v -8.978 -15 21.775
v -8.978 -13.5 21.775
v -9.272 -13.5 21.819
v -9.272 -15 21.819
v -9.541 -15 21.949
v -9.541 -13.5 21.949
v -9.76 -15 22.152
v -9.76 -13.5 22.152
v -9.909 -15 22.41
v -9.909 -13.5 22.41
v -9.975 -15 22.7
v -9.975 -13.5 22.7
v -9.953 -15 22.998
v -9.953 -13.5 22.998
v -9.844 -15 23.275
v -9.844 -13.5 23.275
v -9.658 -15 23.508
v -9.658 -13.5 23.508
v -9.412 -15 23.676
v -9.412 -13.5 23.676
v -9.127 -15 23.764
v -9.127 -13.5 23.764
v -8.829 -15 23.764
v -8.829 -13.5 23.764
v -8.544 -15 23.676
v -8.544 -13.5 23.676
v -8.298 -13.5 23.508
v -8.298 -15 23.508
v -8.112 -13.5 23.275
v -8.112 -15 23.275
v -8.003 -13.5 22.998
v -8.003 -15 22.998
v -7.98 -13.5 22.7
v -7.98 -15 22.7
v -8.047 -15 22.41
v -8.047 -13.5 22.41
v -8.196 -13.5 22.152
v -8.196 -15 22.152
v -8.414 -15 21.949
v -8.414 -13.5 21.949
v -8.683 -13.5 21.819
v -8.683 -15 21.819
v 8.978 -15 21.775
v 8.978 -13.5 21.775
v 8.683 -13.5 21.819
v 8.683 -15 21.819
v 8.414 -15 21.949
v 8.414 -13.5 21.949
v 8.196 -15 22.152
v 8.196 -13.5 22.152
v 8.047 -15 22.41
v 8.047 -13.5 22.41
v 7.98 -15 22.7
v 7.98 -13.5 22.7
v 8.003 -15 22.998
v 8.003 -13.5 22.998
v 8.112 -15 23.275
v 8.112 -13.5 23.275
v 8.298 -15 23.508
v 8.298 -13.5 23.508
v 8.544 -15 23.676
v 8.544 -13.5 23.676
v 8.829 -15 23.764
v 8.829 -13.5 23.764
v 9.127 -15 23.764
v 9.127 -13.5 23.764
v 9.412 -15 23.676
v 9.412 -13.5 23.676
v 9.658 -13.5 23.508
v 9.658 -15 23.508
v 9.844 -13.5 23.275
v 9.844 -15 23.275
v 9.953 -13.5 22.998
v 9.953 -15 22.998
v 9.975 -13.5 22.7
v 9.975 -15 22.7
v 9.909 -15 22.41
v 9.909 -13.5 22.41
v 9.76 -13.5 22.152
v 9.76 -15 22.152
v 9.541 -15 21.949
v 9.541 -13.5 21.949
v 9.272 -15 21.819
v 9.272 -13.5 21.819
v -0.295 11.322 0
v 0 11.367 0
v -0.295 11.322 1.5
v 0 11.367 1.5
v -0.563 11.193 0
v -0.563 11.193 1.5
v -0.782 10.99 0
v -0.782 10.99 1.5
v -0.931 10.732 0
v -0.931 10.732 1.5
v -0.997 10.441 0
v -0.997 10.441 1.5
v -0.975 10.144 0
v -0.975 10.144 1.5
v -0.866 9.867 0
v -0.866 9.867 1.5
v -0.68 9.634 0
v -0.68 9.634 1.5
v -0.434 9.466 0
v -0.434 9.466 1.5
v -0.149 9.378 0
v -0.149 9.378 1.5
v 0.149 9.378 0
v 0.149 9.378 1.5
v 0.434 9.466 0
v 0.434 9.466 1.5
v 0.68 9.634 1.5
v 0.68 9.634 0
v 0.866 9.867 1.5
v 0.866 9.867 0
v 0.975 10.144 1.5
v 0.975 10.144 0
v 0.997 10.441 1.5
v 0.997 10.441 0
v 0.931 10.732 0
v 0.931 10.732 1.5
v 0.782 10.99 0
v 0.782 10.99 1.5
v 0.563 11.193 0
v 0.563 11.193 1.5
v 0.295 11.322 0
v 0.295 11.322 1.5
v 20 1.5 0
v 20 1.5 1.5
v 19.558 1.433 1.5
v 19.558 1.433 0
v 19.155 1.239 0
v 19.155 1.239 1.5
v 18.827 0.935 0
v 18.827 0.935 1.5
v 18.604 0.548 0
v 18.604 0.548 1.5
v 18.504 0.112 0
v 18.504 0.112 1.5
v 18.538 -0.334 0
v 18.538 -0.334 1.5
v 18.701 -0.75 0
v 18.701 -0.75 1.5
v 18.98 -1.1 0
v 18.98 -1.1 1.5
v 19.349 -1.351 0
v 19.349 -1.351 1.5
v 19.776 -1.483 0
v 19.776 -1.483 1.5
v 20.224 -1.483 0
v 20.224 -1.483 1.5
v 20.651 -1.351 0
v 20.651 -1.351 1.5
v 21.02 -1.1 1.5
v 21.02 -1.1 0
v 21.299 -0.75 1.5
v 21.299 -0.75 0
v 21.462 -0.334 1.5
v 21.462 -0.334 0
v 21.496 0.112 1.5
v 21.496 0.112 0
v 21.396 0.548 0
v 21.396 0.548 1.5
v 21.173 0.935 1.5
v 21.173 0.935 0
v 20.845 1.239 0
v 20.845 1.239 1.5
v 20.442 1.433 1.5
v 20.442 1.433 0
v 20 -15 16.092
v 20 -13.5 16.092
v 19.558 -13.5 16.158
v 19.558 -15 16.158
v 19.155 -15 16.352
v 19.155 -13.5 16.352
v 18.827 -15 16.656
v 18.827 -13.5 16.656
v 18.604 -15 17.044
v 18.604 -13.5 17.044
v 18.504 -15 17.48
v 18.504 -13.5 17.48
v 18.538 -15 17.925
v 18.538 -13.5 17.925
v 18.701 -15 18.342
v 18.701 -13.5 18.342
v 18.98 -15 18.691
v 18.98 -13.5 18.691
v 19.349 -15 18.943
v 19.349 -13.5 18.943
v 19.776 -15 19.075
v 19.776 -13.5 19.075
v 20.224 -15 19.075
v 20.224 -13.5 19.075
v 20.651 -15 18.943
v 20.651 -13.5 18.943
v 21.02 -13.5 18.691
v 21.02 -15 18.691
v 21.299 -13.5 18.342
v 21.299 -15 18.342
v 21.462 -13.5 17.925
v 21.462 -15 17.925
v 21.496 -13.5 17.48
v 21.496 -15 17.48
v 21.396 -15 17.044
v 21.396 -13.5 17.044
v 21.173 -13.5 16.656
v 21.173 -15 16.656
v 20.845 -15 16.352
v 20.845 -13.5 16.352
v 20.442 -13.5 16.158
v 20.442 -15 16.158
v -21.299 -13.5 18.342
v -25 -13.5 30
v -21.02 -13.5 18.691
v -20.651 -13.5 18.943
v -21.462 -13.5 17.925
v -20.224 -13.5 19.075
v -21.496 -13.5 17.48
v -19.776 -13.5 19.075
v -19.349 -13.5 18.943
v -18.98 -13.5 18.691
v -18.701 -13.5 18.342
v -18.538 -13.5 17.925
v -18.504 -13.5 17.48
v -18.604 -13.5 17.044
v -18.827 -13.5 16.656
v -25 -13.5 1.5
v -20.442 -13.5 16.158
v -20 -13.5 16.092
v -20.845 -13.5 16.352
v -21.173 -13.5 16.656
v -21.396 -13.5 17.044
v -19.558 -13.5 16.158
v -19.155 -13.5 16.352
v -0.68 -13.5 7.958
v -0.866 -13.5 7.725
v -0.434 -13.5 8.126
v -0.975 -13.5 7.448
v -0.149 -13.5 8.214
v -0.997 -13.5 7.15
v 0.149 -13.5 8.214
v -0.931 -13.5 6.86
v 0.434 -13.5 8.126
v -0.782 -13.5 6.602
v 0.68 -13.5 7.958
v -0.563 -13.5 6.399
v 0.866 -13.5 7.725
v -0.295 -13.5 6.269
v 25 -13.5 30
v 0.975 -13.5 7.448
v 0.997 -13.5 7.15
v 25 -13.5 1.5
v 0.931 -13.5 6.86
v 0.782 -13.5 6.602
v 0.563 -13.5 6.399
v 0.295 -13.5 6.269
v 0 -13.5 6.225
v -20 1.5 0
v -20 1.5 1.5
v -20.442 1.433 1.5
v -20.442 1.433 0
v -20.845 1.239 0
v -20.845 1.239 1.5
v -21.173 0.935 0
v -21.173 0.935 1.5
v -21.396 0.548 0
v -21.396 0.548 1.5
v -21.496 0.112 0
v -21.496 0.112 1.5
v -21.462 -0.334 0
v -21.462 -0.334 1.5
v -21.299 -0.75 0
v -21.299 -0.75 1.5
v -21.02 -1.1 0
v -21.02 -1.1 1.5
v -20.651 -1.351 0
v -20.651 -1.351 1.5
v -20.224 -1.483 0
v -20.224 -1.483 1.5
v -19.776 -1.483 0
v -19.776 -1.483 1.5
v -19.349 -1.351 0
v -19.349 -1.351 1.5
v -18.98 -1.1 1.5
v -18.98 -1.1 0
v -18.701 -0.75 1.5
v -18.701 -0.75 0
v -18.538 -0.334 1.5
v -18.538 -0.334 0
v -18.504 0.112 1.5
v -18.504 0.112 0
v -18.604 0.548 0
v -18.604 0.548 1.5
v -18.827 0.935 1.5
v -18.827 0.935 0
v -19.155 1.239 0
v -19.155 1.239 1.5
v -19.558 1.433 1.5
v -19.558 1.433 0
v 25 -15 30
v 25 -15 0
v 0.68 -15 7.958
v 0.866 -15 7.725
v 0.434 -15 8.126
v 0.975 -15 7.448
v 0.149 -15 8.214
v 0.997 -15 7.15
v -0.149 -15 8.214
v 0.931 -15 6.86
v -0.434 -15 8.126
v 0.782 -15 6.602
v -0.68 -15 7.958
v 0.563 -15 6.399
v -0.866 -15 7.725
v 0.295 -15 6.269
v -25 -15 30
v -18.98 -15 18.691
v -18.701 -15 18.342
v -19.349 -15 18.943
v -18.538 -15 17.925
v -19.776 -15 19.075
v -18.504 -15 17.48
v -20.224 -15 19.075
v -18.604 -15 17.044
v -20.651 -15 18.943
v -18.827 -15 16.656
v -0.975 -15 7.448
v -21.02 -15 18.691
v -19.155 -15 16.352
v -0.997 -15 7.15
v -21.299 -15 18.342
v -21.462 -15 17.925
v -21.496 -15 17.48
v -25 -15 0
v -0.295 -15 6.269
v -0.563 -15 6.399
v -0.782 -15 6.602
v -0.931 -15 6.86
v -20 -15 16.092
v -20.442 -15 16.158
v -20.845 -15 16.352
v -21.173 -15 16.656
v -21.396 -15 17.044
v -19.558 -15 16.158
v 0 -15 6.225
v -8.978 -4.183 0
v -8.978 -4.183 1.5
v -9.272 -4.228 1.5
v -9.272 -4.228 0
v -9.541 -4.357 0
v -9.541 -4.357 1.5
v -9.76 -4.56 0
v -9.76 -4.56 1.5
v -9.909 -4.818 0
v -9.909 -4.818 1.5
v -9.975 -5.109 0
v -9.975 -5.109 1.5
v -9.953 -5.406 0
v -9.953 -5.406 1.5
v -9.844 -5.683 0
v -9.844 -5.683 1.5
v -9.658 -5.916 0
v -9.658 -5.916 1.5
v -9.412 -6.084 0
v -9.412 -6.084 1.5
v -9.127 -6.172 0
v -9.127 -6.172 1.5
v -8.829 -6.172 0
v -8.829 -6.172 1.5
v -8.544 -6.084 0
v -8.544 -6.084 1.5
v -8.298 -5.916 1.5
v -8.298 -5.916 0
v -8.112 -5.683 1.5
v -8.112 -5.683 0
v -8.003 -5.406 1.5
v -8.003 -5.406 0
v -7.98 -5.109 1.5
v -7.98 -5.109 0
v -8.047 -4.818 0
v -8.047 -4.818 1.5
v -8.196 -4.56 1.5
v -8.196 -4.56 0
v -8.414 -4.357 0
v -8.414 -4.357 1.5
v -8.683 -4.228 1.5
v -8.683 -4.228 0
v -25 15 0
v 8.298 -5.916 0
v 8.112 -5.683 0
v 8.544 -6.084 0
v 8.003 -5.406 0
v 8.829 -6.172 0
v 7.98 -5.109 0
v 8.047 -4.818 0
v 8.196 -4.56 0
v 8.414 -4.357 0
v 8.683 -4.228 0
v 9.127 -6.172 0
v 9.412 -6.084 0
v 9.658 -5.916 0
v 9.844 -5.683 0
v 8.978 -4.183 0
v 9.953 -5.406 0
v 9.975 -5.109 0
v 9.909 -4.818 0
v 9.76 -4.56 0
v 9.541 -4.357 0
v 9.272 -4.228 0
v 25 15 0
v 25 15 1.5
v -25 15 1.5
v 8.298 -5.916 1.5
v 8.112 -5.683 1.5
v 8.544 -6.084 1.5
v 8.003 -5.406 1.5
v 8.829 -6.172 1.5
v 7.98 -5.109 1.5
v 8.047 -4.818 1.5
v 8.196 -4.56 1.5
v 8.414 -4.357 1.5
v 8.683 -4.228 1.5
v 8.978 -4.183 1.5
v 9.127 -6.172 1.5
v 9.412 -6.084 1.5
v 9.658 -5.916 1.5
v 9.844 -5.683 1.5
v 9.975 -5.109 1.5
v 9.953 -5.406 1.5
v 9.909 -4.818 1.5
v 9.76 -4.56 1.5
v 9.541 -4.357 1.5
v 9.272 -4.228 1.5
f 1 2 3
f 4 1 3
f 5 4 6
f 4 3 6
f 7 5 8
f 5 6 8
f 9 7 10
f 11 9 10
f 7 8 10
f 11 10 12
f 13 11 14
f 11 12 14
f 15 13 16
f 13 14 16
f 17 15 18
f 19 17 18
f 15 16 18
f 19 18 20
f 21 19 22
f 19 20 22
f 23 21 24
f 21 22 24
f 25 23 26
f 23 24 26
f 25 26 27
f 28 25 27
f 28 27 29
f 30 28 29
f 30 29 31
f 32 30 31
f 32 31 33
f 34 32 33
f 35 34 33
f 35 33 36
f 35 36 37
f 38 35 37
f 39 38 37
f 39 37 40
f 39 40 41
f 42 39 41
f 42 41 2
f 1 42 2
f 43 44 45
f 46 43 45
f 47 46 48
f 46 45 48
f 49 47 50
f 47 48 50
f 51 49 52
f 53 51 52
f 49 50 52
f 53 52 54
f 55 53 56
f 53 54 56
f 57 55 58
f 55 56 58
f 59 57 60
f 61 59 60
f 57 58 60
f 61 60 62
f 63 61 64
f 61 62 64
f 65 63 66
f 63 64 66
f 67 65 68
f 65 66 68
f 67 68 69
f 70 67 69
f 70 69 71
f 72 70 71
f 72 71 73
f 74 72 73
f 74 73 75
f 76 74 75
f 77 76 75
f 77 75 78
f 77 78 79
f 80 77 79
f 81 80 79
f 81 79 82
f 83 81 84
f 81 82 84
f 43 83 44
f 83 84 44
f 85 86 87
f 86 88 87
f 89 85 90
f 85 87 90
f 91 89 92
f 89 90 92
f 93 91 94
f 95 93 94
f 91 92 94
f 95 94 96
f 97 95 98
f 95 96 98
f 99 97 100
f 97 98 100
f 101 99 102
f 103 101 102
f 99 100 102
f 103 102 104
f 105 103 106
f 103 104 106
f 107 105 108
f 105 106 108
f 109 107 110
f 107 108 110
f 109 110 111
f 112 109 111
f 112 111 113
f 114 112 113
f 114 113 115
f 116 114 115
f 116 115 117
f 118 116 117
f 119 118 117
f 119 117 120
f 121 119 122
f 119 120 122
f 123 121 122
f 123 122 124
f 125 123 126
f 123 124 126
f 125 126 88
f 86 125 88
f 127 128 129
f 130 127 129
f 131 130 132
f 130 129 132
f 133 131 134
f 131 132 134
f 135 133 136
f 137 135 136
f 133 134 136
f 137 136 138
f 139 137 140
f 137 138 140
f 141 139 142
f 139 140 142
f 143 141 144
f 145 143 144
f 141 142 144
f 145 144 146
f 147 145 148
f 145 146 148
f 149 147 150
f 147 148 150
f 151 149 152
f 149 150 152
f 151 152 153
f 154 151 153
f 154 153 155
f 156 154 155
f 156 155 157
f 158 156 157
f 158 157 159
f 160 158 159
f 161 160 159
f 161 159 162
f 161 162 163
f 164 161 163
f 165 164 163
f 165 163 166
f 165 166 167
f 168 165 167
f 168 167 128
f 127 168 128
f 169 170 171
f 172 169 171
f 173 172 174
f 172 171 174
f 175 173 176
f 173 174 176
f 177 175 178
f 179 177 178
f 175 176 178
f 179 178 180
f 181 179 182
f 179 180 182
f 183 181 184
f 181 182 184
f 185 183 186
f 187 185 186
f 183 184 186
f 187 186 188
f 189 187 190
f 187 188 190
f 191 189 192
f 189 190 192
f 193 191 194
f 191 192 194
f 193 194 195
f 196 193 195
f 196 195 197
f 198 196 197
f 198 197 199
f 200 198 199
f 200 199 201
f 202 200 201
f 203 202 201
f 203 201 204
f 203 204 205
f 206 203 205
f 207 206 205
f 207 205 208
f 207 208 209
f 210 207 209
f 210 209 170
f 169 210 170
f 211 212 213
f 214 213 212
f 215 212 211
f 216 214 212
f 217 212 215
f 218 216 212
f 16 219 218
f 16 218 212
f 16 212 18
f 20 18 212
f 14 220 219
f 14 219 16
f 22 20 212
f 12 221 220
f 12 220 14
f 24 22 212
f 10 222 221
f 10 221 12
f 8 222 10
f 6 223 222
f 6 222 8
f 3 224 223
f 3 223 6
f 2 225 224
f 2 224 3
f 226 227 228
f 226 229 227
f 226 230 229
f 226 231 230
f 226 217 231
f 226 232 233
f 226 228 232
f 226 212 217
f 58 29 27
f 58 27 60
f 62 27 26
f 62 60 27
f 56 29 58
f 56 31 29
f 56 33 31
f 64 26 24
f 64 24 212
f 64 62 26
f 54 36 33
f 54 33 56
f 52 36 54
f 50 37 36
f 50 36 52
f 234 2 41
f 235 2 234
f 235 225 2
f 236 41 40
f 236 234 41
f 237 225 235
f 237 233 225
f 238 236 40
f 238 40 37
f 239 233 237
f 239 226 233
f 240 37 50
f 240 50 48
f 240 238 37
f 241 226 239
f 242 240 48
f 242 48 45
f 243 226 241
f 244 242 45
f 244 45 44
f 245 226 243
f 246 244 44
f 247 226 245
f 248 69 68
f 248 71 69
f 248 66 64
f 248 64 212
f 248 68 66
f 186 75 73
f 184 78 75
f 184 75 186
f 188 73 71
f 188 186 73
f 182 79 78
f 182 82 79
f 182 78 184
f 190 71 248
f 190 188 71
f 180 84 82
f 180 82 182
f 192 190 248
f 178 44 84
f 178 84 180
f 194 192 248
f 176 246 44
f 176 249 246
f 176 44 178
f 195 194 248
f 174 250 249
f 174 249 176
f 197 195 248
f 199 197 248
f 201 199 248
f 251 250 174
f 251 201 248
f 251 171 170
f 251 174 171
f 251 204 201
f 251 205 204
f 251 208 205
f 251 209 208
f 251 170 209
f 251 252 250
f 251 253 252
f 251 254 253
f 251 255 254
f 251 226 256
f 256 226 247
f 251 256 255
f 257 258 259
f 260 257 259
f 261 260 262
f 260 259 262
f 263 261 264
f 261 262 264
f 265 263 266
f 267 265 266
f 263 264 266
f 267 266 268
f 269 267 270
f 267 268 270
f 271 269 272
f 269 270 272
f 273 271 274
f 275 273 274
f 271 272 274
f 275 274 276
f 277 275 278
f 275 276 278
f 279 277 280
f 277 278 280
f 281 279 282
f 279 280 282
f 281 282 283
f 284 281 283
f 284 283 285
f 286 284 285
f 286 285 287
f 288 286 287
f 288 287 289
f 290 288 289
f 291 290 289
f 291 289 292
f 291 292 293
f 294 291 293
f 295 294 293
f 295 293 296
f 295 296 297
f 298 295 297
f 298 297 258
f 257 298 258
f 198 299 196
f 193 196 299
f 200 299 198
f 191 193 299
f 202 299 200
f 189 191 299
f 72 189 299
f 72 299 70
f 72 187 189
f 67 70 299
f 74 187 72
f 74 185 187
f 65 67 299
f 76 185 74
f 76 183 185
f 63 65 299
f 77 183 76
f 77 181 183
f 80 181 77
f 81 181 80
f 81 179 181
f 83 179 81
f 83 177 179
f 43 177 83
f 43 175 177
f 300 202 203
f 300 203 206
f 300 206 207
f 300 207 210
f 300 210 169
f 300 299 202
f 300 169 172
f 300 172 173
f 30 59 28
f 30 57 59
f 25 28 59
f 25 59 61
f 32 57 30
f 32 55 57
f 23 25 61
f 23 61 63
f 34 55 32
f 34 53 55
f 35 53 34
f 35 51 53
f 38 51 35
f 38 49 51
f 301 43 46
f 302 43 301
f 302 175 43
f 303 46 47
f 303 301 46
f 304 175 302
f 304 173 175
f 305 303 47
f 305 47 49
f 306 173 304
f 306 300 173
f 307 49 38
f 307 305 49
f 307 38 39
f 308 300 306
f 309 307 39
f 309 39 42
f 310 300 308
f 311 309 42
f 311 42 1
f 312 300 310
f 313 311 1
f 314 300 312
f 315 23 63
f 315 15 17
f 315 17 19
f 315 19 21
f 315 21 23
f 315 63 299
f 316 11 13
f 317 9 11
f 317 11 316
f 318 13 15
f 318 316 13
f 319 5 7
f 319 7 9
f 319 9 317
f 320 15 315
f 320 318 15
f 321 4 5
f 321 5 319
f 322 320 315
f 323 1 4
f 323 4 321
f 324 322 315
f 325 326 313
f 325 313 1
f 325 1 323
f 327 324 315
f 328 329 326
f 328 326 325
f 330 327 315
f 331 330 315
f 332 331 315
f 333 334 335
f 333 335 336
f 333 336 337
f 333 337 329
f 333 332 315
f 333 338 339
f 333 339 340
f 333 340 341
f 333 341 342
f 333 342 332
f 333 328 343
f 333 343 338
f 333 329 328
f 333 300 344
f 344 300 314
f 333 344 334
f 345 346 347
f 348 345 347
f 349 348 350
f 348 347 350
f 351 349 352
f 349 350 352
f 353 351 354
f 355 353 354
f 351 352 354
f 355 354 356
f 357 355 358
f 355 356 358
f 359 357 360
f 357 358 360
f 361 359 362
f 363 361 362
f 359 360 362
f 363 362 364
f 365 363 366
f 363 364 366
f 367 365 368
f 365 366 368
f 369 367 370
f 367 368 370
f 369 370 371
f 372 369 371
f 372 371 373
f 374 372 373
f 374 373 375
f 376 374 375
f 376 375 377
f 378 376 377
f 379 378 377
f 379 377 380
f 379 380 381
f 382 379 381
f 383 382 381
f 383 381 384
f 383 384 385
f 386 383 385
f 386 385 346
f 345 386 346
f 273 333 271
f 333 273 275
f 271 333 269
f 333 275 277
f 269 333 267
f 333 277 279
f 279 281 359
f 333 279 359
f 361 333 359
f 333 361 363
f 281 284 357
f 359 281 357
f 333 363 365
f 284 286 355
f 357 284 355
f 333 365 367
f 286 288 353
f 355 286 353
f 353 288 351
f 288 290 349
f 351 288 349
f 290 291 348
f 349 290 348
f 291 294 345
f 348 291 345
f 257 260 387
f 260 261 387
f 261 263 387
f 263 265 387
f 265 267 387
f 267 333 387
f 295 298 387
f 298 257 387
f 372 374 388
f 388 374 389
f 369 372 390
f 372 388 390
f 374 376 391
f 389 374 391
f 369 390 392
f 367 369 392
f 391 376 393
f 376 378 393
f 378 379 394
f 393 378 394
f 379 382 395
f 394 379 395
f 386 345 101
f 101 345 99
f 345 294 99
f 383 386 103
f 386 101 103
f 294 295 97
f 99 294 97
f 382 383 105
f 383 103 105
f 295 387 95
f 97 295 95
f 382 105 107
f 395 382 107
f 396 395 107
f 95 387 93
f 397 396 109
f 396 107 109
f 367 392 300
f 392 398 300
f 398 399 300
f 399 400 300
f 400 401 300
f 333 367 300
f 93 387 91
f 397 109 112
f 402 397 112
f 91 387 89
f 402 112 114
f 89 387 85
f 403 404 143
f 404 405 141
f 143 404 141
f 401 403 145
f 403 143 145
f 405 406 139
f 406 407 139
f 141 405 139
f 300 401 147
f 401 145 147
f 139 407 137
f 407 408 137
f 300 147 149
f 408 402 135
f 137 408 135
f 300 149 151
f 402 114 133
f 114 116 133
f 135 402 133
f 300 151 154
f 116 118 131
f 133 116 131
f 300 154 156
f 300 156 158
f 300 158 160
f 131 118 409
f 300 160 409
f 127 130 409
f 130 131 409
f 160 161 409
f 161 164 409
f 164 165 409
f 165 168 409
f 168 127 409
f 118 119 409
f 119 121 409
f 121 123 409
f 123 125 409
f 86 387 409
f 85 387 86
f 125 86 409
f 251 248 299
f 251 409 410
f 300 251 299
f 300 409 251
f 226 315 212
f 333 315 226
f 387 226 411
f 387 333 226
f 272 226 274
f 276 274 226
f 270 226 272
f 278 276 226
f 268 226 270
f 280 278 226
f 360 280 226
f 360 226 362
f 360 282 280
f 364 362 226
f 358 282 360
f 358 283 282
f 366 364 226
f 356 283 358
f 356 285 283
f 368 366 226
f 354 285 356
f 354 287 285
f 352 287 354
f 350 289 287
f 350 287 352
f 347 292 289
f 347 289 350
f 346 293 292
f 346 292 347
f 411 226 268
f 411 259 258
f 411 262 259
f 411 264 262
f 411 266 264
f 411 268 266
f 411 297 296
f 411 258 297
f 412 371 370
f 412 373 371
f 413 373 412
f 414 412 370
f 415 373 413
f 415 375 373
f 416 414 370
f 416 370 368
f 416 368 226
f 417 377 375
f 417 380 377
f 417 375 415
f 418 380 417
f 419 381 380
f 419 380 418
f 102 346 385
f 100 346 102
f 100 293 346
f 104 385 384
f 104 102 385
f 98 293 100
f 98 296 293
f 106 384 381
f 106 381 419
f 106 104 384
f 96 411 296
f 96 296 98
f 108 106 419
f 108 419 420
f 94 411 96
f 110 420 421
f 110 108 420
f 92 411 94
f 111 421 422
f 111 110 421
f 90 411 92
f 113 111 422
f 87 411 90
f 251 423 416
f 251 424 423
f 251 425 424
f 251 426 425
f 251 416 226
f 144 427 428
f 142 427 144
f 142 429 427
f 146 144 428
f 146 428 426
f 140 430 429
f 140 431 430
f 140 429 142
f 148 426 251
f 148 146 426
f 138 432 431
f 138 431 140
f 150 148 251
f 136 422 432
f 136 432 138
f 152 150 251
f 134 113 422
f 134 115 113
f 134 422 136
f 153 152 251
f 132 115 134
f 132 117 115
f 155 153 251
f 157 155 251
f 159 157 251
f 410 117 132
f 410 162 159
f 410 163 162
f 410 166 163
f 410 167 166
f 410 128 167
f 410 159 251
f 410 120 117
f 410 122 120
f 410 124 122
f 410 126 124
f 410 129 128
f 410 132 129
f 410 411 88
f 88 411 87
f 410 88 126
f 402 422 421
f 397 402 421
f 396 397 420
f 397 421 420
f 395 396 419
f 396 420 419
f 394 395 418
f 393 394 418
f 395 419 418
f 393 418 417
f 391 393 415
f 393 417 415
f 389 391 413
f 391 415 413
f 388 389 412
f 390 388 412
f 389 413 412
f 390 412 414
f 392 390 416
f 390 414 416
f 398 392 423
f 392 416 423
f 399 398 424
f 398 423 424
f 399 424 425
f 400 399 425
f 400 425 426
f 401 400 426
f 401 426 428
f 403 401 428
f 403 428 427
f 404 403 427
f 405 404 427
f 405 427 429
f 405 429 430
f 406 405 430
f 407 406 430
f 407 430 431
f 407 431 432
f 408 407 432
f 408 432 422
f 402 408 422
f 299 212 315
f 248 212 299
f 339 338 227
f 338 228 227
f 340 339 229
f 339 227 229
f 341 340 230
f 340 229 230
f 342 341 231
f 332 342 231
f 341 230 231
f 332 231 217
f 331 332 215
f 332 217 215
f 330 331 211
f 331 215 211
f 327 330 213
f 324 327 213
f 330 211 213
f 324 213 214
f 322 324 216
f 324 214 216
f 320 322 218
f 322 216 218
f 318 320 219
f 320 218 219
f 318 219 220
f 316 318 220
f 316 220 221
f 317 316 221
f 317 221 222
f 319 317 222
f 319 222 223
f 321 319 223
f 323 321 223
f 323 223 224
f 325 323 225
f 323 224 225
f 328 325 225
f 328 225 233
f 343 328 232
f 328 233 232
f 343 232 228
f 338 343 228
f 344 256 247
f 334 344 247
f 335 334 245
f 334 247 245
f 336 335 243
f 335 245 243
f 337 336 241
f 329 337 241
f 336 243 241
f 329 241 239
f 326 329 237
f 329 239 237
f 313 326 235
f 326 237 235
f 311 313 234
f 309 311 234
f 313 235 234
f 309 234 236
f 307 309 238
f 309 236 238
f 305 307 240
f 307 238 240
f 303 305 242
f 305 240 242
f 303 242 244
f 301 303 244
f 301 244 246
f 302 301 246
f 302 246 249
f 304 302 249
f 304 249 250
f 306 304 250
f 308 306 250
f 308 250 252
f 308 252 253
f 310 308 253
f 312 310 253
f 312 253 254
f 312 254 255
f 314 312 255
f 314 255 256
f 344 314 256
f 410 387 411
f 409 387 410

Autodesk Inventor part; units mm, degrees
ref_plane "YZ Plane" through (0, 0, 0) normal (1, 0, 0) x (0, 1, 0)
ref_plane "XZ Plane" through (0, 0, 0) normal (0, 1, 0) x (-1, 0, 0)
ref_plane "XY Plane" through (0, 0, 0) normal (0, 0, 1) x (1, 0, 0)
sketch "Sketch7" plane through (0, 0, 0) normal (0, 0, 1) x (1, 0, 0)
  line L0 (25, -15) -> (-25, -15)
  line L1 (-25, -15) -> (-25, 15)
  line L2 (-25, 15) -> (25, 15)
  line L3 (25, 15) -> (25, -15)
  line L4 (25, -15) -> (-25, 15) construction
  line L5 (-25, -15) -> (25, 15) construction
  point P0 (0, 0)
  dimension "d37" = 50
  dimension "d38" = 30
extrude "Extrusion4" add sketch "Sketch7" along normal blind 1.5
sketch "Sketch8" plane through (0, 0, 1.5) normal (0, 0, 1) x (1, 0, 0)
  line L0 (-25, -15) -> (25, -15) projected
  line L1 (-25, 15) -> (-25, -15) projected
  line L2 (25, -15) -> (-25, -15)
  line L3 (-25, -15) -> (-25, -13.5)
  line L4 (-25, -13.5) -> (25, -13.5)
  line L5 (25, -13.5) -> (25, -15)
  point P0 (0, 0)
  dimension "d41" = 1.5
extrude "Extrusion5" add sketch "Sketch8" along normal blind 28.5
sketch "Sketch14" plane through (0, 0, 0) normal (0, 0, -1) x (-1, 0, 0)
  circle A0 centre (0, 0) radius 8.5
  line L0 (-1.5, 8.3666) -> (-1.5, 10.3666)
  line L1 (-1.5, 8.3666) -> (0.5, 8.3666) construction
  line L2 (1.5, 8.3666) -> (1.5, 10.3666)
  arc A1 (1.5, 10.3666) -> (-1.5, 10.3666) centre (0, 10.3666) ccw
  line L3 (-6.4957, -5.4823) -> (-8.2277, -6.4823)
  arc A2 (-9.7277, -3.8843) -> (-8.2277, -6.4823) centre (-8.9777, -5.1833) ccw
  line L4 (-7.9957, -2.8843) -> (-9.7277, -3.8843)
  line L5 (7.9957, -2.8843) -> (9.7277, -3.8843)
  arc A3 (8.2277, -6.4823) -> (9.7277, -3.8843) centre (8.9777, -5.1833) ccw
  line L6 (6.4957, -5.4823) -> (8.2277, -6.4823)
  line L7 (-25, 15) -> (-25, -15) projected
  line L8 (25, -15) -> (25, 15) projected
  point P0 (-20, 0)
  point P1 (20, 0)
  dimension "d80" = 17
  dimension "d127" = 2
  dimension "d128" = 90
  dimension "d131" = 360
  dimension "d146" = 5
  dimension "d147" = 5
hole "Hole5" at (0, 10.3666, 0) at (-8.9777, -5.1833, 0) at (8.9777, -5.1833, 0) direction (0, 0, 1) diameter 2 end through all
hole "Hole6" at (-20, 0, 0) at (20, 0, 0) direction (0, 0, 1) diameter 3 end through all
sketch "Sketch17" plane through (0, -15, 17.5917) normal (0, -1, 0) x (-1, 0, 0)
  circle A0 centre (0, 0) radius 8.5
  line L0 (-1.5, 8.3666) -> (-1.5, 10.3666)
  line L1 (-1.5, 8.3666) -> (0.5, 8.3666) construction
  line L2 (1.5, 8.3666) -> (1.5, 10.3666)
  arc A1 (1.5, 10.3666) -> (-1.5, 10.3666) centre (0, 10.3666) ccw
  line L3 (-6.4957, -5.4823) -> (-8.2277, -6.4823)
  arc A2 (-9.7277, -3.8843) -> (-8.2277, -6.4823) centre (-8.9777, -5.1833) ccw
  line L4 (-7.9957, -2.8843) -> (-9.7277, -3.8843)
  line L5 (7.9957, -2.8843) -> (9.7277, -3.8843)
  arc A3 (8.2277, -6.4823) -> (9.7277, -3.8843) centre (8.9777, -5.1833) ccw
  line L6 (6.4957, -5.4823) -> (8.2277, -6.4823)
  line L7 (-25, 15) -> (-25, -15)
  line L8 (25, -15) -> (25, 15)
  point P0 (-20, 0)
  point P1 (20, 0)
  dimension "d155" = 17
  dimension "d154" = 2
  dimension "d169" = 90
  dimension "d151" = 360
  dimension "d153" = 5
  dimension "d152" = 5
hole "Hole10" at (0, -15, 7.225) at (-8.9777, -15, 22.775) at (8.9777, -15, 22.775) direction (0, 1, 0) diameter 2 end through all
hole "Hole11" at (-20, -15, 17.5917) at (20, -15, 17.5917) direction (0, 1, 0) diameter 3 end through all
properties part number "bracket_design2" material "Aluminum 6061"
